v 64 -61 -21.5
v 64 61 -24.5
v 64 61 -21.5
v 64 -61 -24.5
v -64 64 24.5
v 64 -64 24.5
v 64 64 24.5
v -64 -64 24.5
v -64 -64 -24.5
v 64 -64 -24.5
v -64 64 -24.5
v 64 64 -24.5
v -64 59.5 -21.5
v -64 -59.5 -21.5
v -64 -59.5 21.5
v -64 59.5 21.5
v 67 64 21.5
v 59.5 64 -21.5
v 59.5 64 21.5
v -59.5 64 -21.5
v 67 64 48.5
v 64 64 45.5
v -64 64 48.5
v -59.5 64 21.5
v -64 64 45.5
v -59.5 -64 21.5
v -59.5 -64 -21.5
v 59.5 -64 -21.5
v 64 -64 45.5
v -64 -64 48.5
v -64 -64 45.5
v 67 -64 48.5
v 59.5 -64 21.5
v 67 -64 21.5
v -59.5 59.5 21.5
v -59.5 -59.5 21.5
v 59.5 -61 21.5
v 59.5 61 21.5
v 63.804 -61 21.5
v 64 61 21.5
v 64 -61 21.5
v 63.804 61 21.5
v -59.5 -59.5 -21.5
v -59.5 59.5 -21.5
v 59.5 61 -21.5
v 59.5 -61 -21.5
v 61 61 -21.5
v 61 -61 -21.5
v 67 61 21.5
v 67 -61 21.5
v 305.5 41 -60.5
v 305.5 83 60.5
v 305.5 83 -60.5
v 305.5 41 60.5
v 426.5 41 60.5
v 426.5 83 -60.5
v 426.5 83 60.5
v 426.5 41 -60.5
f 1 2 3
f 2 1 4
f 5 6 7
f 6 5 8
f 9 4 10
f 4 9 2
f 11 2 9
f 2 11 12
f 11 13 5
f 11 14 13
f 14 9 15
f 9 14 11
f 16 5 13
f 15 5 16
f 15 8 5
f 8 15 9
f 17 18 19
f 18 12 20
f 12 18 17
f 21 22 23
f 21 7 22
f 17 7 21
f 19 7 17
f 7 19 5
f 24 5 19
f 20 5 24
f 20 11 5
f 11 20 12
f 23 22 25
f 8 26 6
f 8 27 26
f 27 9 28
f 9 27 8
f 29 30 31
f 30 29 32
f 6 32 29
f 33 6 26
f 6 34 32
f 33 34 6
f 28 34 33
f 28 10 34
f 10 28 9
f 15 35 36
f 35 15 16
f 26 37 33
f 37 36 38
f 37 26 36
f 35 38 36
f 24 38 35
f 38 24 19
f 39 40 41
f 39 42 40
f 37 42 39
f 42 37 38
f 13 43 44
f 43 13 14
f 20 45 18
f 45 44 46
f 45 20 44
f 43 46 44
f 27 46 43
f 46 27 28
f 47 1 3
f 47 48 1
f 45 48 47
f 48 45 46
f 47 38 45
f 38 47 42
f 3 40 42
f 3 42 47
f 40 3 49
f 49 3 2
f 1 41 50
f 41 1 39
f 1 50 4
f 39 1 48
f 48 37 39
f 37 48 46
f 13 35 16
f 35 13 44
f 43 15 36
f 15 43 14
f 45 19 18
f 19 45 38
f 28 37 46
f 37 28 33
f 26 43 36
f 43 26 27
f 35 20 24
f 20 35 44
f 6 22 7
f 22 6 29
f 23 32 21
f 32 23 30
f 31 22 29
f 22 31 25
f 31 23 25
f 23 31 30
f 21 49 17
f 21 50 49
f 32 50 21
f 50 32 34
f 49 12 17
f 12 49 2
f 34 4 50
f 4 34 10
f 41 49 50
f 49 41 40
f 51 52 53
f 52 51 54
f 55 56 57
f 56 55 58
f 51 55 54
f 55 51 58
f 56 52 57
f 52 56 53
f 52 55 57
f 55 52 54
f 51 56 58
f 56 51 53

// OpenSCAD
$fa = 1; 
$fs = 0.5; 

pad = 1;
//hl = 121 + pad; 
//hw = 121 + pad; 
//hh = 42 + pad;
hl = 121 + pad; 
hw = 121 + pad; 
hh = 42 + pad; 

t = 3;   // wall thickness
dt = 21; // desk thickness

module body() { 
    difference() { 
        cube([hw+2*t, hl+2*t, hh+2*t], center=true); 
        
        translate([t, 0, 0])
        cube([hw+t/2, hl, hh], center=true);  
        
        translate([-t*2, 0, 0])
        cube([hw, hl-t, hh], center=true); 
        
        cube([hw-t, hl+t*3, hh], center=true); 
    } 
}

module hanger() { 
    translate([0, 0, hh/2 + t/2 + t + dt])
    cube([hw+2*t, hl+2*t, t], center=true); 

    translate([hw/2 + t*3/2, 0, (dt+t)/2 + (hh)/2 + t])
    cube([t, hw+t*2, dt+t], center=true);
}

module support() { 
    hull() { 
        translate([hw/2 + t/2 + t, hl/2 + t/2, hh/2 + t/2])
        cube([t,t,t], center=true); 

        translate([hw/2 + t/2, hl/2 + t/2, -hh/2 - t/2])
        cube([t,t,t], center=true); 
    }

    hull() { 
        translate([hw/2 + t/2 + t, -hl/2 - t/2, hh/2 + t/2])
        cube([t,t,t], center=true); 

        translate([hw/2 + t/2, -hl/2 - t/2, -hh/2 - t/2])
        cube([t,t,t], center=true); 
    }
    
    translate([hw/2 + t + t/2, 0, hh/2 + t/2]) 
    cube([t, hl+t*2, t], center=true);
}

module shelf() { 
    body(); 
    hanger(); 
    support(); 
}

module demo_cube() { 
    translate([hw*3,hl/2+pad,0])
    rotate([90,0,0])
    cube([hw-pad, hl-pad, hh-pad], center=true); 
}

//rotate([90,0,0])
shelf();

demo_cube(); 
